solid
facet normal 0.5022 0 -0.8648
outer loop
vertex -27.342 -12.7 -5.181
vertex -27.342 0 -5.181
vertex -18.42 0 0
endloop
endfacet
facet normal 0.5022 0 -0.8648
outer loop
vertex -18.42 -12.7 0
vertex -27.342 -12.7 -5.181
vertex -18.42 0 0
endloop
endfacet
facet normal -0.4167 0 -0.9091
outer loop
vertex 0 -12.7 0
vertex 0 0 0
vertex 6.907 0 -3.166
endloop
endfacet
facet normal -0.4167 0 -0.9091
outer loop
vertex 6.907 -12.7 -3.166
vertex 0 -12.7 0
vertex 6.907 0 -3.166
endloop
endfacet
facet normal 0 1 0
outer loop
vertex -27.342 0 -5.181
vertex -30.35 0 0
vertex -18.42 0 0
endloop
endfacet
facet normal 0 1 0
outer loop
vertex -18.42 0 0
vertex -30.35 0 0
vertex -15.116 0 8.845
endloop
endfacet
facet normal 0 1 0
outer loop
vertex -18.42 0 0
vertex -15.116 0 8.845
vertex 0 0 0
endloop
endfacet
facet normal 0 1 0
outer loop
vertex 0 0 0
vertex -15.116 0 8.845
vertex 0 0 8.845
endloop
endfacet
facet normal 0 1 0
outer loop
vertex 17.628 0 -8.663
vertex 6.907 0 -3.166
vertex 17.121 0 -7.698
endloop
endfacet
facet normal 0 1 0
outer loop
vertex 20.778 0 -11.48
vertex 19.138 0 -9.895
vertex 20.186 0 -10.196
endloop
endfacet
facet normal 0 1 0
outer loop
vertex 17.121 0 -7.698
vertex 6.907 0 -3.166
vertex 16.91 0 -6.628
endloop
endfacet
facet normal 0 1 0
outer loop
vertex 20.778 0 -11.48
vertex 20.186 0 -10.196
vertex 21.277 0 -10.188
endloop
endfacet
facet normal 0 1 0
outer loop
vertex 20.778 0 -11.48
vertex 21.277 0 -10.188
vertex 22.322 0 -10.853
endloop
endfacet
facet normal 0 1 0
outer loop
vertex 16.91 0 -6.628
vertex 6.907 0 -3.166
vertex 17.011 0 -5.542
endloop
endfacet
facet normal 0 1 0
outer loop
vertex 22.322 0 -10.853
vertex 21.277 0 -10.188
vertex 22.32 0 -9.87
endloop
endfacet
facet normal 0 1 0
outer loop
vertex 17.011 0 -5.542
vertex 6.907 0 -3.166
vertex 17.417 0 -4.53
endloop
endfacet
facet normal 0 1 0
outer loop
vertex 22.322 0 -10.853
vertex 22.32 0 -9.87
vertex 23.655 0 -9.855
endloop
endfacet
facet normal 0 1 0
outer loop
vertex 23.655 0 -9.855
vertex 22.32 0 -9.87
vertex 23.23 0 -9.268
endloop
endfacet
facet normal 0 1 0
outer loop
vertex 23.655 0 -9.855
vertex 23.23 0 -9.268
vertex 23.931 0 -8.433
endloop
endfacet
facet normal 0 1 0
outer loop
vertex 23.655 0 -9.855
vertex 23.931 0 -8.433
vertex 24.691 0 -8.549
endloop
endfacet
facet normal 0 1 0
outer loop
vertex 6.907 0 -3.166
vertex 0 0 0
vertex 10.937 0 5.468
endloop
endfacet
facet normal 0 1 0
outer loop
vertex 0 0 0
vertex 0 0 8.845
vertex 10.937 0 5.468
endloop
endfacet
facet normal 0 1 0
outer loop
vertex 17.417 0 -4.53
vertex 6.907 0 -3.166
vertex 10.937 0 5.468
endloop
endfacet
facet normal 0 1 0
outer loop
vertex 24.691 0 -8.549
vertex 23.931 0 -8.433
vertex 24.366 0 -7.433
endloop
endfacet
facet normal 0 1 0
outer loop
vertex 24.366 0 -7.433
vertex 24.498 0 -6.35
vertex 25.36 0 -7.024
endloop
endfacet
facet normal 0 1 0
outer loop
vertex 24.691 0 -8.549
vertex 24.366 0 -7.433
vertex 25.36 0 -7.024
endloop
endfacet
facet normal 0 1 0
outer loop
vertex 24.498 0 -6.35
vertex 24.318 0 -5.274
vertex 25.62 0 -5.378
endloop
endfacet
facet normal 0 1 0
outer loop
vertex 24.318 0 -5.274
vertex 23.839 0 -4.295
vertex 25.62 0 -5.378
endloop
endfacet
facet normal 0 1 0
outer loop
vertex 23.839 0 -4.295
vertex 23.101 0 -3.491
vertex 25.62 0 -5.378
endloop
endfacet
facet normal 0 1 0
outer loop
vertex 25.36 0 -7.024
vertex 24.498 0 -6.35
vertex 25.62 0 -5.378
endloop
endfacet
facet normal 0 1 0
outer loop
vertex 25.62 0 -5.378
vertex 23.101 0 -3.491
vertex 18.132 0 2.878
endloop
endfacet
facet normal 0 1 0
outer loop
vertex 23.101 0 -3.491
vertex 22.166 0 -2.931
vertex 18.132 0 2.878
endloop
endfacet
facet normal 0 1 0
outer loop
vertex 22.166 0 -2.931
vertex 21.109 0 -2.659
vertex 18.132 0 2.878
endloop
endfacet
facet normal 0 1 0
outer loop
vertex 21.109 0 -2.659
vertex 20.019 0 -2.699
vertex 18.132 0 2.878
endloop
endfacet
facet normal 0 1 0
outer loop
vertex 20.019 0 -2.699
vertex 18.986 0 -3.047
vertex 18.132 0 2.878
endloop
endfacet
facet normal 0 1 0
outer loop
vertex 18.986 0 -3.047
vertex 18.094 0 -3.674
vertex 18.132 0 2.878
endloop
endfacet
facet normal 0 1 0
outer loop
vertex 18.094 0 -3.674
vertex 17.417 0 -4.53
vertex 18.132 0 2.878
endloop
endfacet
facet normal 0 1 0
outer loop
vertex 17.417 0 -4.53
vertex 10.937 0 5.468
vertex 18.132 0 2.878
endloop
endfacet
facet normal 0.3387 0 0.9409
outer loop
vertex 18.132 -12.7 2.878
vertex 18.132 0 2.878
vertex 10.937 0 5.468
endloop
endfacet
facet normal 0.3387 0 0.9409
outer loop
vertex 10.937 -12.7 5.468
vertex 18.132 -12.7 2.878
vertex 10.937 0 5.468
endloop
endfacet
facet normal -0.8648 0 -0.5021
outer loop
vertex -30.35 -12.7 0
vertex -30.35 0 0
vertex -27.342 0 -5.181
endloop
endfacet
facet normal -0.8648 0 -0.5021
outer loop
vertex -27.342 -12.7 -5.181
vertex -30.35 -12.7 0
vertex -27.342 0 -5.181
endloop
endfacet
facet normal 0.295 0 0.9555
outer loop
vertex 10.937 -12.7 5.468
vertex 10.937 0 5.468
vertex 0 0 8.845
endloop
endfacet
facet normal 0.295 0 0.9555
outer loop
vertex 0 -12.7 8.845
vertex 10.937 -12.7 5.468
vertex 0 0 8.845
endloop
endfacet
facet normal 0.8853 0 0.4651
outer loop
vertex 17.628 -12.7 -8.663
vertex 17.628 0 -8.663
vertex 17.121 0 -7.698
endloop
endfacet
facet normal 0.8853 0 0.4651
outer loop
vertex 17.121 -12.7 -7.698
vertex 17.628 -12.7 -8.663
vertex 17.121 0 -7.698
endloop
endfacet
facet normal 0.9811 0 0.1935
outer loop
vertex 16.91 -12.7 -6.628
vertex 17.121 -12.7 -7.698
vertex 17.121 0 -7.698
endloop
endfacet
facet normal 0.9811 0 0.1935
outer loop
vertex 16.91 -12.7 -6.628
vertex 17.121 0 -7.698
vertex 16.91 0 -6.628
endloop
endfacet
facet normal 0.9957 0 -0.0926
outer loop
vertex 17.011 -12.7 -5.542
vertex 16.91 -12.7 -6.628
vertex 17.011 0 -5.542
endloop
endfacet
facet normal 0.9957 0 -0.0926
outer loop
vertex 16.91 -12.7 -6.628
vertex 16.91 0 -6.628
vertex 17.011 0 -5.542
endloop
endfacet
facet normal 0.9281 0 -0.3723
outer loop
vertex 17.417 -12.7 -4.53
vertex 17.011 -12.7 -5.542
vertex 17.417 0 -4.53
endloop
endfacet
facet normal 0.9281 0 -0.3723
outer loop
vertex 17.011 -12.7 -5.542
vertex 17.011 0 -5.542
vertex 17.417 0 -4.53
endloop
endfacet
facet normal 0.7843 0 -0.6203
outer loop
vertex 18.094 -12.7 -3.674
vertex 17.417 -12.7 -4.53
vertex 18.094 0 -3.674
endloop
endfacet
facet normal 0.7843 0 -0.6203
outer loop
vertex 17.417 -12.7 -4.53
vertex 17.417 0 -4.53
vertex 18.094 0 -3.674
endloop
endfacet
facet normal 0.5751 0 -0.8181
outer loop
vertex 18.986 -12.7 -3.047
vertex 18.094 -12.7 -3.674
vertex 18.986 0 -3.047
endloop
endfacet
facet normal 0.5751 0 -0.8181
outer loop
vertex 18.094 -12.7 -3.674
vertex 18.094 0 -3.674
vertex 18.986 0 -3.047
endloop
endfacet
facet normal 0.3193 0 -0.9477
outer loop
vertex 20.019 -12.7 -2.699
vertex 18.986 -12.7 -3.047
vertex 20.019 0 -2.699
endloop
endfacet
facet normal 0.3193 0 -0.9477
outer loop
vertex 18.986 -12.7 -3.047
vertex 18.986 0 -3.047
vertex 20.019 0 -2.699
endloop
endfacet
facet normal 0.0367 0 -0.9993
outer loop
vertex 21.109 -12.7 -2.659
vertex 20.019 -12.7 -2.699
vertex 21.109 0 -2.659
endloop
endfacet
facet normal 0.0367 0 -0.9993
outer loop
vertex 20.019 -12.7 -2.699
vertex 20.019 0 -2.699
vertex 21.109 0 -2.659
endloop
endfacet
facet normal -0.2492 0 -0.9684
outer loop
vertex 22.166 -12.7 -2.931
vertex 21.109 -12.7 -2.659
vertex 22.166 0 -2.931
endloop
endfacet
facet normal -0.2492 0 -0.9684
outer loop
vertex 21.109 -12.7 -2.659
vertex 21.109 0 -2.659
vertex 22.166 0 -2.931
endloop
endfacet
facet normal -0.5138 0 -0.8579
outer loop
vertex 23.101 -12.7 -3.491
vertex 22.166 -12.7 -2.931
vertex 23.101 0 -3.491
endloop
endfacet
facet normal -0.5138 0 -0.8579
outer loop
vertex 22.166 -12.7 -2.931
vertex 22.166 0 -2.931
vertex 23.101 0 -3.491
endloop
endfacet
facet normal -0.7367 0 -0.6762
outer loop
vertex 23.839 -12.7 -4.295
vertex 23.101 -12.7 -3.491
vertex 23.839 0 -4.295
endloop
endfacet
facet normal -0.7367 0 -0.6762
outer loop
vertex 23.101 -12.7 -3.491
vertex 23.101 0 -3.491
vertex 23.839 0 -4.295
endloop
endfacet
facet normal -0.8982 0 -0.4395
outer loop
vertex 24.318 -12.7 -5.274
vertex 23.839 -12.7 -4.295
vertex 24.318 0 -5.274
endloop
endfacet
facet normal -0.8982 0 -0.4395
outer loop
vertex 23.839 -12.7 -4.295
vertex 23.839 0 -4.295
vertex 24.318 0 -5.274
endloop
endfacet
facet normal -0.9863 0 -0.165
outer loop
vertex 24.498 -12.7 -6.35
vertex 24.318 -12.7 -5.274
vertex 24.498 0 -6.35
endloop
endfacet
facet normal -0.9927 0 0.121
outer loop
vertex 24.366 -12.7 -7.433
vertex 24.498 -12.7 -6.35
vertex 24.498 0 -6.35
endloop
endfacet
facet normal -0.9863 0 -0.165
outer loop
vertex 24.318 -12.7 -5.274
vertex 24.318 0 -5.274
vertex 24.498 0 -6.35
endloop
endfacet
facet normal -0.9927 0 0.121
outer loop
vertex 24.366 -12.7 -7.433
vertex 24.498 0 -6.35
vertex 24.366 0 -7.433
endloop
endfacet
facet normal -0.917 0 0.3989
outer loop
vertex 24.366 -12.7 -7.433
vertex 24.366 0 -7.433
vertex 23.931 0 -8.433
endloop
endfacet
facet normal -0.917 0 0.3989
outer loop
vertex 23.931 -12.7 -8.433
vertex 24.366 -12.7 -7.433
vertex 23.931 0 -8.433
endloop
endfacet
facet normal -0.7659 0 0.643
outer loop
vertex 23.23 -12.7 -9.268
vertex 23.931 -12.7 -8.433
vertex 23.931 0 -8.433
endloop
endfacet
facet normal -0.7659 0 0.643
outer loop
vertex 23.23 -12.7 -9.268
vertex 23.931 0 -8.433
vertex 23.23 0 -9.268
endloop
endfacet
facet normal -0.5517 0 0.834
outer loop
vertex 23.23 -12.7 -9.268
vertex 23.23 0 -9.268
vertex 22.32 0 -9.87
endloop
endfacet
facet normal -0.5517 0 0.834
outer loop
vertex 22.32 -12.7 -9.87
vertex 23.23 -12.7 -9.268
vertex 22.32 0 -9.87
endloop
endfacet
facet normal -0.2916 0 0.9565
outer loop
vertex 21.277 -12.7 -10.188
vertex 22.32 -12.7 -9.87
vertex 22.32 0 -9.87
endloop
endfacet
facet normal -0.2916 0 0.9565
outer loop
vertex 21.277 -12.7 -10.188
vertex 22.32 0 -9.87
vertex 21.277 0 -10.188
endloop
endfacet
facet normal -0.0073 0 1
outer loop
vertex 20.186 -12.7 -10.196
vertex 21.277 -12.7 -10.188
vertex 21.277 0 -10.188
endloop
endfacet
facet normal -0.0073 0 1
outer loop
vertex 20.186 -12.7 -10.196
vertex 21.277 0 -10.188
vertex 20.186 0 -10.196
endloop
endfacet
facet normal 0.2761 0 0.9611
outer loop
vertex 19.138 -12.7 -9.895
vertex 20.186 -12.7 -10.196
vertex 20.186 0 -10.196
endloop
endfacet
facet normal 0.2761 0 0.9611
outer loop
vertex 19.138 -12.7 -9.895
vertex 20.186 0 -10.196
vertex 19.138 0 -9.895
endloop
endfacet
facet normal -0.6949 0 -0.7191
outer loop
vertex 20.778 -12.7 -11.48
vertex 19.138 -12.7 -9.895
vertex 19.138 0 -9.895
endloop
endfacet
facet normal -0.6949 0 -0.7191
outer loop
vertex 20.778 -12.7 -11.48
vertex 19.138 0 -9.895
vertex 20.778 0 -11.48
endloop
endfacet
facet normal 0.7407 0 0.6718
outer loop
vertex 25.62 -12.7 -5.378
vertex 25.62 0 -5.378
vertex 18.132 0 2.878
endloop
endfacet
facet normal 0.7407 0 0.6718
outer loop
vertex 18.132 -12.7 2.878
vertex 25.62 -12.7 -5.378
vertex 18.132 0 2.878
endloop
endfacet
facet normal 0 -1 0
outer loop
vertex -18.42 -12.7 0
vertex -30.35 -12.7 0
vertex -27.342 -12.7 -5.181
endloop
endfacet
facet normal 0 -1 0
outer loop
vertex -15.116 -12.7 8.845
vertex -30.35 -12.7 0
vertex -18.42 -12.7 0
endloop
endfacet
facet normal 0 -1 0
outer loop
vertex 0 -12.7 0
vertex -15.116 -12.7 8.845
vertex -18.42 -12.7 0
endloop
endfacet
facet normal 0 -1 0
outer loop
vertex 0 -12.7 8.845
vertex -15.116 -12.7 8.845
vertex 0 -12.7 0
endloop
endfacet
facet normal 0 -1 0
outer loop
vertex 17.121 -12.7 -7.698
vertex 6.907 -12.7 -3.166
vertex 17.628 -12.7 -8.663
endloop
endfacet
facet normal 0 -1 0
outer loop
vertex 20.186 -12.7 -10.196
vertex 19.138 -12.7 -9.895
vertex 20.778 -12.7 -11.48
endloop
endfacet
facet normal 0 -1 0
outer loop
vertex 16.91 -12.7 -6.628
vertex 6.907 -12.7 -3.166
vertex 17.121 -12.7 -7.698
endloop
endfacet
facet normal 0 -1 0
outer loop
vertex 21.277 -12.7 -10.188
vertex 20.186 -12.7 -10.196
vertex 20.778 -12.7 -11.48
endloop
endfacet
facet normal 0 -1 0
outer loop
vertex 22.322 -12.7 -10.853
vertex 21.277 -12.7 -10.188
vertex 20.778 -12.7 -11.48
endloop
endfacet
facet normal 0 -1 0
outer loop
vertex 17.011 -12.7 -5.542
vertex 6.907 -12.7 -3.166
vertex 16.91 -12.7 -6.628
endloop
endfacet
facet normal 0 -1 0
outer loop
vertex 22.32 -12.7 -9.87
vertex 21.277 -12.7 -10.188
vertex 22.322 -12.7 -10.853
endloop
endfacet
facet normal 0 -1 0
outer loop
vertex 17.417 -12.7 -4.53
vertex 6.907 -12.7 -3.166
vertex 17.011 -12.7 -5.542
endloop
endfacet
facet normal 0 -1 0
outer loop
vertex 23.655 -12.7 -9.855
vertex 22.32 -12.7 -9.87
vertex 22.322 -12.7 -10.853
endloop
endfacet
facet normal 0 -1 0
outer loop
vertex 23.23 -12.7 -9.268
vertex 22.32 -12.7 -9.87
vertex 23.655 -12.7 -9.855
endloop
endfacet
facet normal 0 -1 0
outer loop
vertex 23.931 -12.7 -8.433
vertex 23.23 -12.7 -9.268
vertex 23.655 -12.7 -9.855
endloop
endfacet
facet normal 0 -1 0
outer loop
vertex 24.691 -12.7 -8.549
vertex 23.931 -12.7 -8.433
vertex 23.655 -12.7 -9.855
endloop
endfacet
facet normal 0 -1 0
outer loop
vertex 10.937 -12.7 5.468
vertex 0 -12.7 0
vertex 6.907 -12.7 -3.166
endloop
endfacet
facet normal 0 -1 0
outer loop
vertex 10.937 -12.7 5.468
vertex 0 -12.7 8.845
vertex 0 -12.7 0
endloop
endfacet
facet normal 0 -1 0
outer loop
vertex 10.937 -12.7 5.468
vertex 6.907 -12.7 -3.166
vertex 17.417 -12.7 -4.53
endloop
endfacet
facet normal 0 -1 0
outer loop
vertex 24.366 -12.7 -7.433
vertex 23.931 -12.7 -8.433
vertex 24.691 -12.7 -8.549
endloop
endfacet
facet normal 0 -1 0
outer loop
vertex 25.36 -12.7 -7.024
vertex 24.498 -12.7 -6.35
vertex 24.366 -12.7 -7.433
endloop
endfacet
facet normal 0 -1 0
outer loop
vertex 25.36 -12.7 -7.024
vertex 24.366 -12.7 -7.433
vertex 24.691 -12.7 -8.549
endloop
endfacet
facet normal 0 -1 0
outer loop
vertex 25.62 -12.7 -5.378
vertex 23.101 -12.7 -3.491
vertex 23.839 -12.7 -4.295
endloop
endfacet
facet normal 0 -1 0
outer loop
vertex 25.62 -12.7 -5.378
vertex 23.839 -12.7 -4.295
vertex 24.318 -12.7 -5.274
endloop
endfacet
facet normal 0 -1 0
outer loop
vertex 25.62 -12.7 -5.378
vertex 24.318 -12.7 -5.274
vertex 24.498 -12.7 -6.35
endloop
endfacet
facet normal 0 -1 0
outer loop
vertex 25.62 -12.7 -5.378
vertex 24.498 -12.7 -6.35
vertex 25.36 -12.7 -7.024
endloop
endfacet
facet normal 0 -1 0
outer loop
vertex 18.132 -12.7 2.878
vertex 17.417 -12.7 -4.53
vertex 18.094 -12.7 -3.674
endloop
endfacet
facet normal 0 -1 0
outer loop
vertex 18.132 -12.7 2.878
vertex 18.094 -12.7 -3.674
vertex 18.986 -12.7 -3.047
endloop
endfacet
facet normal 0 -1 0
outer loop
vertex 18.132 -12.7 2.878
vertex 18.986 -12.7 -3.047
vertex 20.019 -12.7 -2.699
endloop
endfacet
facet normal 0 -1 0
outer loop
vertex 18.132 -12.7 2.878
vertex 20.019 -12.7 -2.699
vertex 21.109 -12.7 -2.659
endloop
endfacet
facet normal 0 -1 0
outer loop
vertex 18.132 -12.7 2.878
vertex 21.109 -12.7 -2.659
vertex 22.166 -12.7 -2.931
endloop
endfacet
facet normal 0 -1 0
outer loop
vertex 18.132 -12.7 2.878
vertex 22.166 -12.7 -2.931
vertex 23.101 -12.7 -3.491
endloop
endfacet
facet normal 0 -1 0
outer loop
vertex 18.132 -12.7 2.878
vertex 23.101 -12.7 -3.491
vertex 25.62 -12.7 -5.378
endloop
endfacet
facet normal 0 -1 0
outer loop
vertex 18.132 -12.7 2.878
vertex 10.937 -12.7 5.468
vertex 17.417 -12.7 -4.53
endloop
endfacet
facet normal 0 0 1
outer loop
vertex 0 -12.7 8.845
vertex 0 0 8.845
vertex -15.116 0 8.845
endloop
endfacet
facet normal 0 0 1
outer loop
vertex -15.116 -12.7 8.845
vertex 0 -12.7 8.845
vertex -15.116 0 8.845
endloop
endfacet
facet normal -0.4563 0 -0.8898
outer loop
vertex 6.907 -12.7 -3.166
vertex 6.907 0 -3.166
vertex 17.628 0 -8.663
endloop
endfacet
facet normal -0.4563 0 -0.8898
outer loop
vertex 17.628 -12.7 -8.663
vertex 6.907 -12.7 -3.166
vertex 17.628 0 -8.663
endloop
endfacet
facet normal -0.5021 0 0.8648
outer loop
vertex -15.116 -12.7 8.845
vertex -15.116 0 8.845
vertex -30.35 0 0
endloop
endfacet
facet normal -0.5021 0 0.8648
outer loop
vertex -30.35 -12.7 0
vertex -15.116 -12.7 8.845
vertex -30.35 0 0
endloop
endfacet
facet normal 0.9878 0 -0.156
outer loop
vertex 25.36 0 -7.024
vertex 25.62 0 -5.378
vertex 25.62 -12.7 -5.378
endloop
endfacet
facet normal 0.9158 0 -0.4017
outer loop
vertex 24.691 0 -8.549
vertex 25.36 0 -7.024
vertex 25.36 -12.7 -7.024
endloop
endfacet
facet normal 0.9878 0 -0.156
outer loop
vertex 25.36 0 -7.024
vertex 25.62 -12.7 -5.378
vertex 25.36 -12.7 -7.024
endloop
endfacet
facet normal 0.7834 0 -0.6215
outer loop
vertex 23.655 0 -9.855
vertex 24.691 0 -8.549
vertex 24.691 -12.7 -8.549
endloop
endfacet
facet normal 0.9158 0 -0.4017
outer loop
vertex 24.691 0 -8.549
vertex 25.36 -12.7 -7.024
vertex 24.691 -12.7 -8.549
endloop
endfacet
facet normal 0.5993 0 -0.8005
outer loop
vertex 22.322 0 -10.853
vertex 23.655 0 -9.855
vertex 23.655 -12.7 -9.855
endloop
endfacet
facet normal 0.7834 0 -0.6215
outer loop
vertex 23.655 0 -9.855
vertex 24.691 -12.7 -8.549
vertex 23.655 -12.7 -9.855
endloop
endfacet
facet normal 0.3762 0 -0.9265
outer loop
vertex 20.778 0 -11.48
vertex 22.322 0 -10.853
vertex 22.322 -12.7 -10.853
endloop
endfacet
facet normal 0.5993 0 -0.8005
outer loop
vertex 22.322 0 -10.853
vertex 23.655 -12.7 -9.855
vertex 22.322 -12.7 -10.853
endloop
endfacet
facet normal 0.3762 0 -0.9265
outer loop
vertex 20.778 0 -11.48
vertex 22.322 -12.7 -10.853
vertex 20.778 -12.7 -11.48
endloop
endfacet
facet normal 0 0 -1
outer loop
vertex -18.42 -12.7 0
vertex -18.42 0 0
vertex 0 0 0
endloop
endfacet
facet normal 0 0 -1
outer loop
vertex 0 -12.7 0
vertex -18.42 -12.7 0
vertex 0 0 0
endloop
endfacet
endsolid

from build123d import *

# Parameters (mm, degrees)
F1_DEPTH = 12.7
F3_D     = 7.5946
F5_DEPTH = 25.4


with BuildPart() as f1:
    # F0 (on Front) → F1 (new body)
    with BuildSketch(Plane.XZ):
        Polygon((-18.419567, 0), (0, 0), (6.907339, -3.165863), (18.131765, -8.921978), (26.765935, -17.268345), (29.356185, -9.49759), (18.131765, 2.878058), (10.936619, 5.468309), (0, 8.845153), (-15.116255, 8.845153), (-30.349583, 0), (-27.34155, -5.180503), align=None)
    extrude(amount=F1_DEPTH)

    # F3 (through all)
    with Locations(Plane.XZ.offset(12.7)):
        with Locations((20.701887, -6.43437)):
            Hole(F3_D / 2)

    # F4 (on face) → F5 (cut)
    with BuildSketch(Plane.XZ.offset(12.7)):
        with BuildLine():
            ThreePointArc((25.619942, -5.378141), (24.214986, -9.235351), (20.777755, -11.47977))
            Line((20.777755, -11.47977), (26.765935, -17.268345))
            Line((26.765935, -17.268345), (29.356185, -9.49759))
            Line((29.356185, -9.49759), (25.619942, -5.378141))
        make_face()
    extrude(amount=-F5_DEPTH, mode=Mode.SUBTRACT)


solid = f1.part
